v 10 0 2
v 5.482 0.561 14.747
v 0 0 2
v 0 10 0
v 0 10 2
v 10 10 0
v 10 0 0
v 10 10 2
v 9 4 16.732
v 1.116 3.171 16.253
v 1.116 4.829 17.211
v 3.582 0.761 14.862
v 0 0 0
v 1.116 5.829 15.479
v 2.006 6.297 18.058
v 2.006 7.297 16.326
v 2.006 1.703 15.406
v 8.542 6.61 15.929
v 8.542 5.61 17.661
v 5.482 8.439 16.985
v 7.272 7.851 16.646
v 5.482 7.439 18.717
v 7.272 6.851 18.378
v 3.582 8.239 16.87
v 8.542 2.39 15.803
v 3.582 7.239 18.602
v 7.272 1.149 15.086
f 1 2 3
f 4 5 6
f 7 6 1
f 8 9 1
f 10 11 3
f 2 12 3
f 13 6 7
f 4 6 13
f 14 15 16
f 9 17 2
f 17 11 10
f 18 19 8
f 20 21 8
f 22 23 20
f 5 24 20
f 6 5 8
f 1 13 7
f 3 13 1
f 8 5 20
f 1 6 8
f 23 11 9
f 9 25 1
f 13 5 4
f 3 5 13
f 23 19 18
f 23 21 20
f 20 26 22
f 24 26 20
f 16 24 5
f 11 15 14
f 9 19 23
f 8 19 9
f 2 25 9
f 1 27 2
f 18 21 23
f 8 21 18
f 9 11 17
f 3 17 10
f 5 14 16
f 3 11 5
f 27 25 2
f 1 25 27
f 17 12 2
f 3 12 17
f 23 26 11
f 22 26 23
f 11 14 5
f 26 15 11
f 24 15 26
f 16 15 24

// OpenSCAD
// case 10: a slab and a tipped cylinder — oblique cones from the slab corners to the rims.
hull() { cube([10, 10, 2]); translate([5, 5, 15]) rotate([30, 0, 0]) cylinder(r = 4, h = 2); }
